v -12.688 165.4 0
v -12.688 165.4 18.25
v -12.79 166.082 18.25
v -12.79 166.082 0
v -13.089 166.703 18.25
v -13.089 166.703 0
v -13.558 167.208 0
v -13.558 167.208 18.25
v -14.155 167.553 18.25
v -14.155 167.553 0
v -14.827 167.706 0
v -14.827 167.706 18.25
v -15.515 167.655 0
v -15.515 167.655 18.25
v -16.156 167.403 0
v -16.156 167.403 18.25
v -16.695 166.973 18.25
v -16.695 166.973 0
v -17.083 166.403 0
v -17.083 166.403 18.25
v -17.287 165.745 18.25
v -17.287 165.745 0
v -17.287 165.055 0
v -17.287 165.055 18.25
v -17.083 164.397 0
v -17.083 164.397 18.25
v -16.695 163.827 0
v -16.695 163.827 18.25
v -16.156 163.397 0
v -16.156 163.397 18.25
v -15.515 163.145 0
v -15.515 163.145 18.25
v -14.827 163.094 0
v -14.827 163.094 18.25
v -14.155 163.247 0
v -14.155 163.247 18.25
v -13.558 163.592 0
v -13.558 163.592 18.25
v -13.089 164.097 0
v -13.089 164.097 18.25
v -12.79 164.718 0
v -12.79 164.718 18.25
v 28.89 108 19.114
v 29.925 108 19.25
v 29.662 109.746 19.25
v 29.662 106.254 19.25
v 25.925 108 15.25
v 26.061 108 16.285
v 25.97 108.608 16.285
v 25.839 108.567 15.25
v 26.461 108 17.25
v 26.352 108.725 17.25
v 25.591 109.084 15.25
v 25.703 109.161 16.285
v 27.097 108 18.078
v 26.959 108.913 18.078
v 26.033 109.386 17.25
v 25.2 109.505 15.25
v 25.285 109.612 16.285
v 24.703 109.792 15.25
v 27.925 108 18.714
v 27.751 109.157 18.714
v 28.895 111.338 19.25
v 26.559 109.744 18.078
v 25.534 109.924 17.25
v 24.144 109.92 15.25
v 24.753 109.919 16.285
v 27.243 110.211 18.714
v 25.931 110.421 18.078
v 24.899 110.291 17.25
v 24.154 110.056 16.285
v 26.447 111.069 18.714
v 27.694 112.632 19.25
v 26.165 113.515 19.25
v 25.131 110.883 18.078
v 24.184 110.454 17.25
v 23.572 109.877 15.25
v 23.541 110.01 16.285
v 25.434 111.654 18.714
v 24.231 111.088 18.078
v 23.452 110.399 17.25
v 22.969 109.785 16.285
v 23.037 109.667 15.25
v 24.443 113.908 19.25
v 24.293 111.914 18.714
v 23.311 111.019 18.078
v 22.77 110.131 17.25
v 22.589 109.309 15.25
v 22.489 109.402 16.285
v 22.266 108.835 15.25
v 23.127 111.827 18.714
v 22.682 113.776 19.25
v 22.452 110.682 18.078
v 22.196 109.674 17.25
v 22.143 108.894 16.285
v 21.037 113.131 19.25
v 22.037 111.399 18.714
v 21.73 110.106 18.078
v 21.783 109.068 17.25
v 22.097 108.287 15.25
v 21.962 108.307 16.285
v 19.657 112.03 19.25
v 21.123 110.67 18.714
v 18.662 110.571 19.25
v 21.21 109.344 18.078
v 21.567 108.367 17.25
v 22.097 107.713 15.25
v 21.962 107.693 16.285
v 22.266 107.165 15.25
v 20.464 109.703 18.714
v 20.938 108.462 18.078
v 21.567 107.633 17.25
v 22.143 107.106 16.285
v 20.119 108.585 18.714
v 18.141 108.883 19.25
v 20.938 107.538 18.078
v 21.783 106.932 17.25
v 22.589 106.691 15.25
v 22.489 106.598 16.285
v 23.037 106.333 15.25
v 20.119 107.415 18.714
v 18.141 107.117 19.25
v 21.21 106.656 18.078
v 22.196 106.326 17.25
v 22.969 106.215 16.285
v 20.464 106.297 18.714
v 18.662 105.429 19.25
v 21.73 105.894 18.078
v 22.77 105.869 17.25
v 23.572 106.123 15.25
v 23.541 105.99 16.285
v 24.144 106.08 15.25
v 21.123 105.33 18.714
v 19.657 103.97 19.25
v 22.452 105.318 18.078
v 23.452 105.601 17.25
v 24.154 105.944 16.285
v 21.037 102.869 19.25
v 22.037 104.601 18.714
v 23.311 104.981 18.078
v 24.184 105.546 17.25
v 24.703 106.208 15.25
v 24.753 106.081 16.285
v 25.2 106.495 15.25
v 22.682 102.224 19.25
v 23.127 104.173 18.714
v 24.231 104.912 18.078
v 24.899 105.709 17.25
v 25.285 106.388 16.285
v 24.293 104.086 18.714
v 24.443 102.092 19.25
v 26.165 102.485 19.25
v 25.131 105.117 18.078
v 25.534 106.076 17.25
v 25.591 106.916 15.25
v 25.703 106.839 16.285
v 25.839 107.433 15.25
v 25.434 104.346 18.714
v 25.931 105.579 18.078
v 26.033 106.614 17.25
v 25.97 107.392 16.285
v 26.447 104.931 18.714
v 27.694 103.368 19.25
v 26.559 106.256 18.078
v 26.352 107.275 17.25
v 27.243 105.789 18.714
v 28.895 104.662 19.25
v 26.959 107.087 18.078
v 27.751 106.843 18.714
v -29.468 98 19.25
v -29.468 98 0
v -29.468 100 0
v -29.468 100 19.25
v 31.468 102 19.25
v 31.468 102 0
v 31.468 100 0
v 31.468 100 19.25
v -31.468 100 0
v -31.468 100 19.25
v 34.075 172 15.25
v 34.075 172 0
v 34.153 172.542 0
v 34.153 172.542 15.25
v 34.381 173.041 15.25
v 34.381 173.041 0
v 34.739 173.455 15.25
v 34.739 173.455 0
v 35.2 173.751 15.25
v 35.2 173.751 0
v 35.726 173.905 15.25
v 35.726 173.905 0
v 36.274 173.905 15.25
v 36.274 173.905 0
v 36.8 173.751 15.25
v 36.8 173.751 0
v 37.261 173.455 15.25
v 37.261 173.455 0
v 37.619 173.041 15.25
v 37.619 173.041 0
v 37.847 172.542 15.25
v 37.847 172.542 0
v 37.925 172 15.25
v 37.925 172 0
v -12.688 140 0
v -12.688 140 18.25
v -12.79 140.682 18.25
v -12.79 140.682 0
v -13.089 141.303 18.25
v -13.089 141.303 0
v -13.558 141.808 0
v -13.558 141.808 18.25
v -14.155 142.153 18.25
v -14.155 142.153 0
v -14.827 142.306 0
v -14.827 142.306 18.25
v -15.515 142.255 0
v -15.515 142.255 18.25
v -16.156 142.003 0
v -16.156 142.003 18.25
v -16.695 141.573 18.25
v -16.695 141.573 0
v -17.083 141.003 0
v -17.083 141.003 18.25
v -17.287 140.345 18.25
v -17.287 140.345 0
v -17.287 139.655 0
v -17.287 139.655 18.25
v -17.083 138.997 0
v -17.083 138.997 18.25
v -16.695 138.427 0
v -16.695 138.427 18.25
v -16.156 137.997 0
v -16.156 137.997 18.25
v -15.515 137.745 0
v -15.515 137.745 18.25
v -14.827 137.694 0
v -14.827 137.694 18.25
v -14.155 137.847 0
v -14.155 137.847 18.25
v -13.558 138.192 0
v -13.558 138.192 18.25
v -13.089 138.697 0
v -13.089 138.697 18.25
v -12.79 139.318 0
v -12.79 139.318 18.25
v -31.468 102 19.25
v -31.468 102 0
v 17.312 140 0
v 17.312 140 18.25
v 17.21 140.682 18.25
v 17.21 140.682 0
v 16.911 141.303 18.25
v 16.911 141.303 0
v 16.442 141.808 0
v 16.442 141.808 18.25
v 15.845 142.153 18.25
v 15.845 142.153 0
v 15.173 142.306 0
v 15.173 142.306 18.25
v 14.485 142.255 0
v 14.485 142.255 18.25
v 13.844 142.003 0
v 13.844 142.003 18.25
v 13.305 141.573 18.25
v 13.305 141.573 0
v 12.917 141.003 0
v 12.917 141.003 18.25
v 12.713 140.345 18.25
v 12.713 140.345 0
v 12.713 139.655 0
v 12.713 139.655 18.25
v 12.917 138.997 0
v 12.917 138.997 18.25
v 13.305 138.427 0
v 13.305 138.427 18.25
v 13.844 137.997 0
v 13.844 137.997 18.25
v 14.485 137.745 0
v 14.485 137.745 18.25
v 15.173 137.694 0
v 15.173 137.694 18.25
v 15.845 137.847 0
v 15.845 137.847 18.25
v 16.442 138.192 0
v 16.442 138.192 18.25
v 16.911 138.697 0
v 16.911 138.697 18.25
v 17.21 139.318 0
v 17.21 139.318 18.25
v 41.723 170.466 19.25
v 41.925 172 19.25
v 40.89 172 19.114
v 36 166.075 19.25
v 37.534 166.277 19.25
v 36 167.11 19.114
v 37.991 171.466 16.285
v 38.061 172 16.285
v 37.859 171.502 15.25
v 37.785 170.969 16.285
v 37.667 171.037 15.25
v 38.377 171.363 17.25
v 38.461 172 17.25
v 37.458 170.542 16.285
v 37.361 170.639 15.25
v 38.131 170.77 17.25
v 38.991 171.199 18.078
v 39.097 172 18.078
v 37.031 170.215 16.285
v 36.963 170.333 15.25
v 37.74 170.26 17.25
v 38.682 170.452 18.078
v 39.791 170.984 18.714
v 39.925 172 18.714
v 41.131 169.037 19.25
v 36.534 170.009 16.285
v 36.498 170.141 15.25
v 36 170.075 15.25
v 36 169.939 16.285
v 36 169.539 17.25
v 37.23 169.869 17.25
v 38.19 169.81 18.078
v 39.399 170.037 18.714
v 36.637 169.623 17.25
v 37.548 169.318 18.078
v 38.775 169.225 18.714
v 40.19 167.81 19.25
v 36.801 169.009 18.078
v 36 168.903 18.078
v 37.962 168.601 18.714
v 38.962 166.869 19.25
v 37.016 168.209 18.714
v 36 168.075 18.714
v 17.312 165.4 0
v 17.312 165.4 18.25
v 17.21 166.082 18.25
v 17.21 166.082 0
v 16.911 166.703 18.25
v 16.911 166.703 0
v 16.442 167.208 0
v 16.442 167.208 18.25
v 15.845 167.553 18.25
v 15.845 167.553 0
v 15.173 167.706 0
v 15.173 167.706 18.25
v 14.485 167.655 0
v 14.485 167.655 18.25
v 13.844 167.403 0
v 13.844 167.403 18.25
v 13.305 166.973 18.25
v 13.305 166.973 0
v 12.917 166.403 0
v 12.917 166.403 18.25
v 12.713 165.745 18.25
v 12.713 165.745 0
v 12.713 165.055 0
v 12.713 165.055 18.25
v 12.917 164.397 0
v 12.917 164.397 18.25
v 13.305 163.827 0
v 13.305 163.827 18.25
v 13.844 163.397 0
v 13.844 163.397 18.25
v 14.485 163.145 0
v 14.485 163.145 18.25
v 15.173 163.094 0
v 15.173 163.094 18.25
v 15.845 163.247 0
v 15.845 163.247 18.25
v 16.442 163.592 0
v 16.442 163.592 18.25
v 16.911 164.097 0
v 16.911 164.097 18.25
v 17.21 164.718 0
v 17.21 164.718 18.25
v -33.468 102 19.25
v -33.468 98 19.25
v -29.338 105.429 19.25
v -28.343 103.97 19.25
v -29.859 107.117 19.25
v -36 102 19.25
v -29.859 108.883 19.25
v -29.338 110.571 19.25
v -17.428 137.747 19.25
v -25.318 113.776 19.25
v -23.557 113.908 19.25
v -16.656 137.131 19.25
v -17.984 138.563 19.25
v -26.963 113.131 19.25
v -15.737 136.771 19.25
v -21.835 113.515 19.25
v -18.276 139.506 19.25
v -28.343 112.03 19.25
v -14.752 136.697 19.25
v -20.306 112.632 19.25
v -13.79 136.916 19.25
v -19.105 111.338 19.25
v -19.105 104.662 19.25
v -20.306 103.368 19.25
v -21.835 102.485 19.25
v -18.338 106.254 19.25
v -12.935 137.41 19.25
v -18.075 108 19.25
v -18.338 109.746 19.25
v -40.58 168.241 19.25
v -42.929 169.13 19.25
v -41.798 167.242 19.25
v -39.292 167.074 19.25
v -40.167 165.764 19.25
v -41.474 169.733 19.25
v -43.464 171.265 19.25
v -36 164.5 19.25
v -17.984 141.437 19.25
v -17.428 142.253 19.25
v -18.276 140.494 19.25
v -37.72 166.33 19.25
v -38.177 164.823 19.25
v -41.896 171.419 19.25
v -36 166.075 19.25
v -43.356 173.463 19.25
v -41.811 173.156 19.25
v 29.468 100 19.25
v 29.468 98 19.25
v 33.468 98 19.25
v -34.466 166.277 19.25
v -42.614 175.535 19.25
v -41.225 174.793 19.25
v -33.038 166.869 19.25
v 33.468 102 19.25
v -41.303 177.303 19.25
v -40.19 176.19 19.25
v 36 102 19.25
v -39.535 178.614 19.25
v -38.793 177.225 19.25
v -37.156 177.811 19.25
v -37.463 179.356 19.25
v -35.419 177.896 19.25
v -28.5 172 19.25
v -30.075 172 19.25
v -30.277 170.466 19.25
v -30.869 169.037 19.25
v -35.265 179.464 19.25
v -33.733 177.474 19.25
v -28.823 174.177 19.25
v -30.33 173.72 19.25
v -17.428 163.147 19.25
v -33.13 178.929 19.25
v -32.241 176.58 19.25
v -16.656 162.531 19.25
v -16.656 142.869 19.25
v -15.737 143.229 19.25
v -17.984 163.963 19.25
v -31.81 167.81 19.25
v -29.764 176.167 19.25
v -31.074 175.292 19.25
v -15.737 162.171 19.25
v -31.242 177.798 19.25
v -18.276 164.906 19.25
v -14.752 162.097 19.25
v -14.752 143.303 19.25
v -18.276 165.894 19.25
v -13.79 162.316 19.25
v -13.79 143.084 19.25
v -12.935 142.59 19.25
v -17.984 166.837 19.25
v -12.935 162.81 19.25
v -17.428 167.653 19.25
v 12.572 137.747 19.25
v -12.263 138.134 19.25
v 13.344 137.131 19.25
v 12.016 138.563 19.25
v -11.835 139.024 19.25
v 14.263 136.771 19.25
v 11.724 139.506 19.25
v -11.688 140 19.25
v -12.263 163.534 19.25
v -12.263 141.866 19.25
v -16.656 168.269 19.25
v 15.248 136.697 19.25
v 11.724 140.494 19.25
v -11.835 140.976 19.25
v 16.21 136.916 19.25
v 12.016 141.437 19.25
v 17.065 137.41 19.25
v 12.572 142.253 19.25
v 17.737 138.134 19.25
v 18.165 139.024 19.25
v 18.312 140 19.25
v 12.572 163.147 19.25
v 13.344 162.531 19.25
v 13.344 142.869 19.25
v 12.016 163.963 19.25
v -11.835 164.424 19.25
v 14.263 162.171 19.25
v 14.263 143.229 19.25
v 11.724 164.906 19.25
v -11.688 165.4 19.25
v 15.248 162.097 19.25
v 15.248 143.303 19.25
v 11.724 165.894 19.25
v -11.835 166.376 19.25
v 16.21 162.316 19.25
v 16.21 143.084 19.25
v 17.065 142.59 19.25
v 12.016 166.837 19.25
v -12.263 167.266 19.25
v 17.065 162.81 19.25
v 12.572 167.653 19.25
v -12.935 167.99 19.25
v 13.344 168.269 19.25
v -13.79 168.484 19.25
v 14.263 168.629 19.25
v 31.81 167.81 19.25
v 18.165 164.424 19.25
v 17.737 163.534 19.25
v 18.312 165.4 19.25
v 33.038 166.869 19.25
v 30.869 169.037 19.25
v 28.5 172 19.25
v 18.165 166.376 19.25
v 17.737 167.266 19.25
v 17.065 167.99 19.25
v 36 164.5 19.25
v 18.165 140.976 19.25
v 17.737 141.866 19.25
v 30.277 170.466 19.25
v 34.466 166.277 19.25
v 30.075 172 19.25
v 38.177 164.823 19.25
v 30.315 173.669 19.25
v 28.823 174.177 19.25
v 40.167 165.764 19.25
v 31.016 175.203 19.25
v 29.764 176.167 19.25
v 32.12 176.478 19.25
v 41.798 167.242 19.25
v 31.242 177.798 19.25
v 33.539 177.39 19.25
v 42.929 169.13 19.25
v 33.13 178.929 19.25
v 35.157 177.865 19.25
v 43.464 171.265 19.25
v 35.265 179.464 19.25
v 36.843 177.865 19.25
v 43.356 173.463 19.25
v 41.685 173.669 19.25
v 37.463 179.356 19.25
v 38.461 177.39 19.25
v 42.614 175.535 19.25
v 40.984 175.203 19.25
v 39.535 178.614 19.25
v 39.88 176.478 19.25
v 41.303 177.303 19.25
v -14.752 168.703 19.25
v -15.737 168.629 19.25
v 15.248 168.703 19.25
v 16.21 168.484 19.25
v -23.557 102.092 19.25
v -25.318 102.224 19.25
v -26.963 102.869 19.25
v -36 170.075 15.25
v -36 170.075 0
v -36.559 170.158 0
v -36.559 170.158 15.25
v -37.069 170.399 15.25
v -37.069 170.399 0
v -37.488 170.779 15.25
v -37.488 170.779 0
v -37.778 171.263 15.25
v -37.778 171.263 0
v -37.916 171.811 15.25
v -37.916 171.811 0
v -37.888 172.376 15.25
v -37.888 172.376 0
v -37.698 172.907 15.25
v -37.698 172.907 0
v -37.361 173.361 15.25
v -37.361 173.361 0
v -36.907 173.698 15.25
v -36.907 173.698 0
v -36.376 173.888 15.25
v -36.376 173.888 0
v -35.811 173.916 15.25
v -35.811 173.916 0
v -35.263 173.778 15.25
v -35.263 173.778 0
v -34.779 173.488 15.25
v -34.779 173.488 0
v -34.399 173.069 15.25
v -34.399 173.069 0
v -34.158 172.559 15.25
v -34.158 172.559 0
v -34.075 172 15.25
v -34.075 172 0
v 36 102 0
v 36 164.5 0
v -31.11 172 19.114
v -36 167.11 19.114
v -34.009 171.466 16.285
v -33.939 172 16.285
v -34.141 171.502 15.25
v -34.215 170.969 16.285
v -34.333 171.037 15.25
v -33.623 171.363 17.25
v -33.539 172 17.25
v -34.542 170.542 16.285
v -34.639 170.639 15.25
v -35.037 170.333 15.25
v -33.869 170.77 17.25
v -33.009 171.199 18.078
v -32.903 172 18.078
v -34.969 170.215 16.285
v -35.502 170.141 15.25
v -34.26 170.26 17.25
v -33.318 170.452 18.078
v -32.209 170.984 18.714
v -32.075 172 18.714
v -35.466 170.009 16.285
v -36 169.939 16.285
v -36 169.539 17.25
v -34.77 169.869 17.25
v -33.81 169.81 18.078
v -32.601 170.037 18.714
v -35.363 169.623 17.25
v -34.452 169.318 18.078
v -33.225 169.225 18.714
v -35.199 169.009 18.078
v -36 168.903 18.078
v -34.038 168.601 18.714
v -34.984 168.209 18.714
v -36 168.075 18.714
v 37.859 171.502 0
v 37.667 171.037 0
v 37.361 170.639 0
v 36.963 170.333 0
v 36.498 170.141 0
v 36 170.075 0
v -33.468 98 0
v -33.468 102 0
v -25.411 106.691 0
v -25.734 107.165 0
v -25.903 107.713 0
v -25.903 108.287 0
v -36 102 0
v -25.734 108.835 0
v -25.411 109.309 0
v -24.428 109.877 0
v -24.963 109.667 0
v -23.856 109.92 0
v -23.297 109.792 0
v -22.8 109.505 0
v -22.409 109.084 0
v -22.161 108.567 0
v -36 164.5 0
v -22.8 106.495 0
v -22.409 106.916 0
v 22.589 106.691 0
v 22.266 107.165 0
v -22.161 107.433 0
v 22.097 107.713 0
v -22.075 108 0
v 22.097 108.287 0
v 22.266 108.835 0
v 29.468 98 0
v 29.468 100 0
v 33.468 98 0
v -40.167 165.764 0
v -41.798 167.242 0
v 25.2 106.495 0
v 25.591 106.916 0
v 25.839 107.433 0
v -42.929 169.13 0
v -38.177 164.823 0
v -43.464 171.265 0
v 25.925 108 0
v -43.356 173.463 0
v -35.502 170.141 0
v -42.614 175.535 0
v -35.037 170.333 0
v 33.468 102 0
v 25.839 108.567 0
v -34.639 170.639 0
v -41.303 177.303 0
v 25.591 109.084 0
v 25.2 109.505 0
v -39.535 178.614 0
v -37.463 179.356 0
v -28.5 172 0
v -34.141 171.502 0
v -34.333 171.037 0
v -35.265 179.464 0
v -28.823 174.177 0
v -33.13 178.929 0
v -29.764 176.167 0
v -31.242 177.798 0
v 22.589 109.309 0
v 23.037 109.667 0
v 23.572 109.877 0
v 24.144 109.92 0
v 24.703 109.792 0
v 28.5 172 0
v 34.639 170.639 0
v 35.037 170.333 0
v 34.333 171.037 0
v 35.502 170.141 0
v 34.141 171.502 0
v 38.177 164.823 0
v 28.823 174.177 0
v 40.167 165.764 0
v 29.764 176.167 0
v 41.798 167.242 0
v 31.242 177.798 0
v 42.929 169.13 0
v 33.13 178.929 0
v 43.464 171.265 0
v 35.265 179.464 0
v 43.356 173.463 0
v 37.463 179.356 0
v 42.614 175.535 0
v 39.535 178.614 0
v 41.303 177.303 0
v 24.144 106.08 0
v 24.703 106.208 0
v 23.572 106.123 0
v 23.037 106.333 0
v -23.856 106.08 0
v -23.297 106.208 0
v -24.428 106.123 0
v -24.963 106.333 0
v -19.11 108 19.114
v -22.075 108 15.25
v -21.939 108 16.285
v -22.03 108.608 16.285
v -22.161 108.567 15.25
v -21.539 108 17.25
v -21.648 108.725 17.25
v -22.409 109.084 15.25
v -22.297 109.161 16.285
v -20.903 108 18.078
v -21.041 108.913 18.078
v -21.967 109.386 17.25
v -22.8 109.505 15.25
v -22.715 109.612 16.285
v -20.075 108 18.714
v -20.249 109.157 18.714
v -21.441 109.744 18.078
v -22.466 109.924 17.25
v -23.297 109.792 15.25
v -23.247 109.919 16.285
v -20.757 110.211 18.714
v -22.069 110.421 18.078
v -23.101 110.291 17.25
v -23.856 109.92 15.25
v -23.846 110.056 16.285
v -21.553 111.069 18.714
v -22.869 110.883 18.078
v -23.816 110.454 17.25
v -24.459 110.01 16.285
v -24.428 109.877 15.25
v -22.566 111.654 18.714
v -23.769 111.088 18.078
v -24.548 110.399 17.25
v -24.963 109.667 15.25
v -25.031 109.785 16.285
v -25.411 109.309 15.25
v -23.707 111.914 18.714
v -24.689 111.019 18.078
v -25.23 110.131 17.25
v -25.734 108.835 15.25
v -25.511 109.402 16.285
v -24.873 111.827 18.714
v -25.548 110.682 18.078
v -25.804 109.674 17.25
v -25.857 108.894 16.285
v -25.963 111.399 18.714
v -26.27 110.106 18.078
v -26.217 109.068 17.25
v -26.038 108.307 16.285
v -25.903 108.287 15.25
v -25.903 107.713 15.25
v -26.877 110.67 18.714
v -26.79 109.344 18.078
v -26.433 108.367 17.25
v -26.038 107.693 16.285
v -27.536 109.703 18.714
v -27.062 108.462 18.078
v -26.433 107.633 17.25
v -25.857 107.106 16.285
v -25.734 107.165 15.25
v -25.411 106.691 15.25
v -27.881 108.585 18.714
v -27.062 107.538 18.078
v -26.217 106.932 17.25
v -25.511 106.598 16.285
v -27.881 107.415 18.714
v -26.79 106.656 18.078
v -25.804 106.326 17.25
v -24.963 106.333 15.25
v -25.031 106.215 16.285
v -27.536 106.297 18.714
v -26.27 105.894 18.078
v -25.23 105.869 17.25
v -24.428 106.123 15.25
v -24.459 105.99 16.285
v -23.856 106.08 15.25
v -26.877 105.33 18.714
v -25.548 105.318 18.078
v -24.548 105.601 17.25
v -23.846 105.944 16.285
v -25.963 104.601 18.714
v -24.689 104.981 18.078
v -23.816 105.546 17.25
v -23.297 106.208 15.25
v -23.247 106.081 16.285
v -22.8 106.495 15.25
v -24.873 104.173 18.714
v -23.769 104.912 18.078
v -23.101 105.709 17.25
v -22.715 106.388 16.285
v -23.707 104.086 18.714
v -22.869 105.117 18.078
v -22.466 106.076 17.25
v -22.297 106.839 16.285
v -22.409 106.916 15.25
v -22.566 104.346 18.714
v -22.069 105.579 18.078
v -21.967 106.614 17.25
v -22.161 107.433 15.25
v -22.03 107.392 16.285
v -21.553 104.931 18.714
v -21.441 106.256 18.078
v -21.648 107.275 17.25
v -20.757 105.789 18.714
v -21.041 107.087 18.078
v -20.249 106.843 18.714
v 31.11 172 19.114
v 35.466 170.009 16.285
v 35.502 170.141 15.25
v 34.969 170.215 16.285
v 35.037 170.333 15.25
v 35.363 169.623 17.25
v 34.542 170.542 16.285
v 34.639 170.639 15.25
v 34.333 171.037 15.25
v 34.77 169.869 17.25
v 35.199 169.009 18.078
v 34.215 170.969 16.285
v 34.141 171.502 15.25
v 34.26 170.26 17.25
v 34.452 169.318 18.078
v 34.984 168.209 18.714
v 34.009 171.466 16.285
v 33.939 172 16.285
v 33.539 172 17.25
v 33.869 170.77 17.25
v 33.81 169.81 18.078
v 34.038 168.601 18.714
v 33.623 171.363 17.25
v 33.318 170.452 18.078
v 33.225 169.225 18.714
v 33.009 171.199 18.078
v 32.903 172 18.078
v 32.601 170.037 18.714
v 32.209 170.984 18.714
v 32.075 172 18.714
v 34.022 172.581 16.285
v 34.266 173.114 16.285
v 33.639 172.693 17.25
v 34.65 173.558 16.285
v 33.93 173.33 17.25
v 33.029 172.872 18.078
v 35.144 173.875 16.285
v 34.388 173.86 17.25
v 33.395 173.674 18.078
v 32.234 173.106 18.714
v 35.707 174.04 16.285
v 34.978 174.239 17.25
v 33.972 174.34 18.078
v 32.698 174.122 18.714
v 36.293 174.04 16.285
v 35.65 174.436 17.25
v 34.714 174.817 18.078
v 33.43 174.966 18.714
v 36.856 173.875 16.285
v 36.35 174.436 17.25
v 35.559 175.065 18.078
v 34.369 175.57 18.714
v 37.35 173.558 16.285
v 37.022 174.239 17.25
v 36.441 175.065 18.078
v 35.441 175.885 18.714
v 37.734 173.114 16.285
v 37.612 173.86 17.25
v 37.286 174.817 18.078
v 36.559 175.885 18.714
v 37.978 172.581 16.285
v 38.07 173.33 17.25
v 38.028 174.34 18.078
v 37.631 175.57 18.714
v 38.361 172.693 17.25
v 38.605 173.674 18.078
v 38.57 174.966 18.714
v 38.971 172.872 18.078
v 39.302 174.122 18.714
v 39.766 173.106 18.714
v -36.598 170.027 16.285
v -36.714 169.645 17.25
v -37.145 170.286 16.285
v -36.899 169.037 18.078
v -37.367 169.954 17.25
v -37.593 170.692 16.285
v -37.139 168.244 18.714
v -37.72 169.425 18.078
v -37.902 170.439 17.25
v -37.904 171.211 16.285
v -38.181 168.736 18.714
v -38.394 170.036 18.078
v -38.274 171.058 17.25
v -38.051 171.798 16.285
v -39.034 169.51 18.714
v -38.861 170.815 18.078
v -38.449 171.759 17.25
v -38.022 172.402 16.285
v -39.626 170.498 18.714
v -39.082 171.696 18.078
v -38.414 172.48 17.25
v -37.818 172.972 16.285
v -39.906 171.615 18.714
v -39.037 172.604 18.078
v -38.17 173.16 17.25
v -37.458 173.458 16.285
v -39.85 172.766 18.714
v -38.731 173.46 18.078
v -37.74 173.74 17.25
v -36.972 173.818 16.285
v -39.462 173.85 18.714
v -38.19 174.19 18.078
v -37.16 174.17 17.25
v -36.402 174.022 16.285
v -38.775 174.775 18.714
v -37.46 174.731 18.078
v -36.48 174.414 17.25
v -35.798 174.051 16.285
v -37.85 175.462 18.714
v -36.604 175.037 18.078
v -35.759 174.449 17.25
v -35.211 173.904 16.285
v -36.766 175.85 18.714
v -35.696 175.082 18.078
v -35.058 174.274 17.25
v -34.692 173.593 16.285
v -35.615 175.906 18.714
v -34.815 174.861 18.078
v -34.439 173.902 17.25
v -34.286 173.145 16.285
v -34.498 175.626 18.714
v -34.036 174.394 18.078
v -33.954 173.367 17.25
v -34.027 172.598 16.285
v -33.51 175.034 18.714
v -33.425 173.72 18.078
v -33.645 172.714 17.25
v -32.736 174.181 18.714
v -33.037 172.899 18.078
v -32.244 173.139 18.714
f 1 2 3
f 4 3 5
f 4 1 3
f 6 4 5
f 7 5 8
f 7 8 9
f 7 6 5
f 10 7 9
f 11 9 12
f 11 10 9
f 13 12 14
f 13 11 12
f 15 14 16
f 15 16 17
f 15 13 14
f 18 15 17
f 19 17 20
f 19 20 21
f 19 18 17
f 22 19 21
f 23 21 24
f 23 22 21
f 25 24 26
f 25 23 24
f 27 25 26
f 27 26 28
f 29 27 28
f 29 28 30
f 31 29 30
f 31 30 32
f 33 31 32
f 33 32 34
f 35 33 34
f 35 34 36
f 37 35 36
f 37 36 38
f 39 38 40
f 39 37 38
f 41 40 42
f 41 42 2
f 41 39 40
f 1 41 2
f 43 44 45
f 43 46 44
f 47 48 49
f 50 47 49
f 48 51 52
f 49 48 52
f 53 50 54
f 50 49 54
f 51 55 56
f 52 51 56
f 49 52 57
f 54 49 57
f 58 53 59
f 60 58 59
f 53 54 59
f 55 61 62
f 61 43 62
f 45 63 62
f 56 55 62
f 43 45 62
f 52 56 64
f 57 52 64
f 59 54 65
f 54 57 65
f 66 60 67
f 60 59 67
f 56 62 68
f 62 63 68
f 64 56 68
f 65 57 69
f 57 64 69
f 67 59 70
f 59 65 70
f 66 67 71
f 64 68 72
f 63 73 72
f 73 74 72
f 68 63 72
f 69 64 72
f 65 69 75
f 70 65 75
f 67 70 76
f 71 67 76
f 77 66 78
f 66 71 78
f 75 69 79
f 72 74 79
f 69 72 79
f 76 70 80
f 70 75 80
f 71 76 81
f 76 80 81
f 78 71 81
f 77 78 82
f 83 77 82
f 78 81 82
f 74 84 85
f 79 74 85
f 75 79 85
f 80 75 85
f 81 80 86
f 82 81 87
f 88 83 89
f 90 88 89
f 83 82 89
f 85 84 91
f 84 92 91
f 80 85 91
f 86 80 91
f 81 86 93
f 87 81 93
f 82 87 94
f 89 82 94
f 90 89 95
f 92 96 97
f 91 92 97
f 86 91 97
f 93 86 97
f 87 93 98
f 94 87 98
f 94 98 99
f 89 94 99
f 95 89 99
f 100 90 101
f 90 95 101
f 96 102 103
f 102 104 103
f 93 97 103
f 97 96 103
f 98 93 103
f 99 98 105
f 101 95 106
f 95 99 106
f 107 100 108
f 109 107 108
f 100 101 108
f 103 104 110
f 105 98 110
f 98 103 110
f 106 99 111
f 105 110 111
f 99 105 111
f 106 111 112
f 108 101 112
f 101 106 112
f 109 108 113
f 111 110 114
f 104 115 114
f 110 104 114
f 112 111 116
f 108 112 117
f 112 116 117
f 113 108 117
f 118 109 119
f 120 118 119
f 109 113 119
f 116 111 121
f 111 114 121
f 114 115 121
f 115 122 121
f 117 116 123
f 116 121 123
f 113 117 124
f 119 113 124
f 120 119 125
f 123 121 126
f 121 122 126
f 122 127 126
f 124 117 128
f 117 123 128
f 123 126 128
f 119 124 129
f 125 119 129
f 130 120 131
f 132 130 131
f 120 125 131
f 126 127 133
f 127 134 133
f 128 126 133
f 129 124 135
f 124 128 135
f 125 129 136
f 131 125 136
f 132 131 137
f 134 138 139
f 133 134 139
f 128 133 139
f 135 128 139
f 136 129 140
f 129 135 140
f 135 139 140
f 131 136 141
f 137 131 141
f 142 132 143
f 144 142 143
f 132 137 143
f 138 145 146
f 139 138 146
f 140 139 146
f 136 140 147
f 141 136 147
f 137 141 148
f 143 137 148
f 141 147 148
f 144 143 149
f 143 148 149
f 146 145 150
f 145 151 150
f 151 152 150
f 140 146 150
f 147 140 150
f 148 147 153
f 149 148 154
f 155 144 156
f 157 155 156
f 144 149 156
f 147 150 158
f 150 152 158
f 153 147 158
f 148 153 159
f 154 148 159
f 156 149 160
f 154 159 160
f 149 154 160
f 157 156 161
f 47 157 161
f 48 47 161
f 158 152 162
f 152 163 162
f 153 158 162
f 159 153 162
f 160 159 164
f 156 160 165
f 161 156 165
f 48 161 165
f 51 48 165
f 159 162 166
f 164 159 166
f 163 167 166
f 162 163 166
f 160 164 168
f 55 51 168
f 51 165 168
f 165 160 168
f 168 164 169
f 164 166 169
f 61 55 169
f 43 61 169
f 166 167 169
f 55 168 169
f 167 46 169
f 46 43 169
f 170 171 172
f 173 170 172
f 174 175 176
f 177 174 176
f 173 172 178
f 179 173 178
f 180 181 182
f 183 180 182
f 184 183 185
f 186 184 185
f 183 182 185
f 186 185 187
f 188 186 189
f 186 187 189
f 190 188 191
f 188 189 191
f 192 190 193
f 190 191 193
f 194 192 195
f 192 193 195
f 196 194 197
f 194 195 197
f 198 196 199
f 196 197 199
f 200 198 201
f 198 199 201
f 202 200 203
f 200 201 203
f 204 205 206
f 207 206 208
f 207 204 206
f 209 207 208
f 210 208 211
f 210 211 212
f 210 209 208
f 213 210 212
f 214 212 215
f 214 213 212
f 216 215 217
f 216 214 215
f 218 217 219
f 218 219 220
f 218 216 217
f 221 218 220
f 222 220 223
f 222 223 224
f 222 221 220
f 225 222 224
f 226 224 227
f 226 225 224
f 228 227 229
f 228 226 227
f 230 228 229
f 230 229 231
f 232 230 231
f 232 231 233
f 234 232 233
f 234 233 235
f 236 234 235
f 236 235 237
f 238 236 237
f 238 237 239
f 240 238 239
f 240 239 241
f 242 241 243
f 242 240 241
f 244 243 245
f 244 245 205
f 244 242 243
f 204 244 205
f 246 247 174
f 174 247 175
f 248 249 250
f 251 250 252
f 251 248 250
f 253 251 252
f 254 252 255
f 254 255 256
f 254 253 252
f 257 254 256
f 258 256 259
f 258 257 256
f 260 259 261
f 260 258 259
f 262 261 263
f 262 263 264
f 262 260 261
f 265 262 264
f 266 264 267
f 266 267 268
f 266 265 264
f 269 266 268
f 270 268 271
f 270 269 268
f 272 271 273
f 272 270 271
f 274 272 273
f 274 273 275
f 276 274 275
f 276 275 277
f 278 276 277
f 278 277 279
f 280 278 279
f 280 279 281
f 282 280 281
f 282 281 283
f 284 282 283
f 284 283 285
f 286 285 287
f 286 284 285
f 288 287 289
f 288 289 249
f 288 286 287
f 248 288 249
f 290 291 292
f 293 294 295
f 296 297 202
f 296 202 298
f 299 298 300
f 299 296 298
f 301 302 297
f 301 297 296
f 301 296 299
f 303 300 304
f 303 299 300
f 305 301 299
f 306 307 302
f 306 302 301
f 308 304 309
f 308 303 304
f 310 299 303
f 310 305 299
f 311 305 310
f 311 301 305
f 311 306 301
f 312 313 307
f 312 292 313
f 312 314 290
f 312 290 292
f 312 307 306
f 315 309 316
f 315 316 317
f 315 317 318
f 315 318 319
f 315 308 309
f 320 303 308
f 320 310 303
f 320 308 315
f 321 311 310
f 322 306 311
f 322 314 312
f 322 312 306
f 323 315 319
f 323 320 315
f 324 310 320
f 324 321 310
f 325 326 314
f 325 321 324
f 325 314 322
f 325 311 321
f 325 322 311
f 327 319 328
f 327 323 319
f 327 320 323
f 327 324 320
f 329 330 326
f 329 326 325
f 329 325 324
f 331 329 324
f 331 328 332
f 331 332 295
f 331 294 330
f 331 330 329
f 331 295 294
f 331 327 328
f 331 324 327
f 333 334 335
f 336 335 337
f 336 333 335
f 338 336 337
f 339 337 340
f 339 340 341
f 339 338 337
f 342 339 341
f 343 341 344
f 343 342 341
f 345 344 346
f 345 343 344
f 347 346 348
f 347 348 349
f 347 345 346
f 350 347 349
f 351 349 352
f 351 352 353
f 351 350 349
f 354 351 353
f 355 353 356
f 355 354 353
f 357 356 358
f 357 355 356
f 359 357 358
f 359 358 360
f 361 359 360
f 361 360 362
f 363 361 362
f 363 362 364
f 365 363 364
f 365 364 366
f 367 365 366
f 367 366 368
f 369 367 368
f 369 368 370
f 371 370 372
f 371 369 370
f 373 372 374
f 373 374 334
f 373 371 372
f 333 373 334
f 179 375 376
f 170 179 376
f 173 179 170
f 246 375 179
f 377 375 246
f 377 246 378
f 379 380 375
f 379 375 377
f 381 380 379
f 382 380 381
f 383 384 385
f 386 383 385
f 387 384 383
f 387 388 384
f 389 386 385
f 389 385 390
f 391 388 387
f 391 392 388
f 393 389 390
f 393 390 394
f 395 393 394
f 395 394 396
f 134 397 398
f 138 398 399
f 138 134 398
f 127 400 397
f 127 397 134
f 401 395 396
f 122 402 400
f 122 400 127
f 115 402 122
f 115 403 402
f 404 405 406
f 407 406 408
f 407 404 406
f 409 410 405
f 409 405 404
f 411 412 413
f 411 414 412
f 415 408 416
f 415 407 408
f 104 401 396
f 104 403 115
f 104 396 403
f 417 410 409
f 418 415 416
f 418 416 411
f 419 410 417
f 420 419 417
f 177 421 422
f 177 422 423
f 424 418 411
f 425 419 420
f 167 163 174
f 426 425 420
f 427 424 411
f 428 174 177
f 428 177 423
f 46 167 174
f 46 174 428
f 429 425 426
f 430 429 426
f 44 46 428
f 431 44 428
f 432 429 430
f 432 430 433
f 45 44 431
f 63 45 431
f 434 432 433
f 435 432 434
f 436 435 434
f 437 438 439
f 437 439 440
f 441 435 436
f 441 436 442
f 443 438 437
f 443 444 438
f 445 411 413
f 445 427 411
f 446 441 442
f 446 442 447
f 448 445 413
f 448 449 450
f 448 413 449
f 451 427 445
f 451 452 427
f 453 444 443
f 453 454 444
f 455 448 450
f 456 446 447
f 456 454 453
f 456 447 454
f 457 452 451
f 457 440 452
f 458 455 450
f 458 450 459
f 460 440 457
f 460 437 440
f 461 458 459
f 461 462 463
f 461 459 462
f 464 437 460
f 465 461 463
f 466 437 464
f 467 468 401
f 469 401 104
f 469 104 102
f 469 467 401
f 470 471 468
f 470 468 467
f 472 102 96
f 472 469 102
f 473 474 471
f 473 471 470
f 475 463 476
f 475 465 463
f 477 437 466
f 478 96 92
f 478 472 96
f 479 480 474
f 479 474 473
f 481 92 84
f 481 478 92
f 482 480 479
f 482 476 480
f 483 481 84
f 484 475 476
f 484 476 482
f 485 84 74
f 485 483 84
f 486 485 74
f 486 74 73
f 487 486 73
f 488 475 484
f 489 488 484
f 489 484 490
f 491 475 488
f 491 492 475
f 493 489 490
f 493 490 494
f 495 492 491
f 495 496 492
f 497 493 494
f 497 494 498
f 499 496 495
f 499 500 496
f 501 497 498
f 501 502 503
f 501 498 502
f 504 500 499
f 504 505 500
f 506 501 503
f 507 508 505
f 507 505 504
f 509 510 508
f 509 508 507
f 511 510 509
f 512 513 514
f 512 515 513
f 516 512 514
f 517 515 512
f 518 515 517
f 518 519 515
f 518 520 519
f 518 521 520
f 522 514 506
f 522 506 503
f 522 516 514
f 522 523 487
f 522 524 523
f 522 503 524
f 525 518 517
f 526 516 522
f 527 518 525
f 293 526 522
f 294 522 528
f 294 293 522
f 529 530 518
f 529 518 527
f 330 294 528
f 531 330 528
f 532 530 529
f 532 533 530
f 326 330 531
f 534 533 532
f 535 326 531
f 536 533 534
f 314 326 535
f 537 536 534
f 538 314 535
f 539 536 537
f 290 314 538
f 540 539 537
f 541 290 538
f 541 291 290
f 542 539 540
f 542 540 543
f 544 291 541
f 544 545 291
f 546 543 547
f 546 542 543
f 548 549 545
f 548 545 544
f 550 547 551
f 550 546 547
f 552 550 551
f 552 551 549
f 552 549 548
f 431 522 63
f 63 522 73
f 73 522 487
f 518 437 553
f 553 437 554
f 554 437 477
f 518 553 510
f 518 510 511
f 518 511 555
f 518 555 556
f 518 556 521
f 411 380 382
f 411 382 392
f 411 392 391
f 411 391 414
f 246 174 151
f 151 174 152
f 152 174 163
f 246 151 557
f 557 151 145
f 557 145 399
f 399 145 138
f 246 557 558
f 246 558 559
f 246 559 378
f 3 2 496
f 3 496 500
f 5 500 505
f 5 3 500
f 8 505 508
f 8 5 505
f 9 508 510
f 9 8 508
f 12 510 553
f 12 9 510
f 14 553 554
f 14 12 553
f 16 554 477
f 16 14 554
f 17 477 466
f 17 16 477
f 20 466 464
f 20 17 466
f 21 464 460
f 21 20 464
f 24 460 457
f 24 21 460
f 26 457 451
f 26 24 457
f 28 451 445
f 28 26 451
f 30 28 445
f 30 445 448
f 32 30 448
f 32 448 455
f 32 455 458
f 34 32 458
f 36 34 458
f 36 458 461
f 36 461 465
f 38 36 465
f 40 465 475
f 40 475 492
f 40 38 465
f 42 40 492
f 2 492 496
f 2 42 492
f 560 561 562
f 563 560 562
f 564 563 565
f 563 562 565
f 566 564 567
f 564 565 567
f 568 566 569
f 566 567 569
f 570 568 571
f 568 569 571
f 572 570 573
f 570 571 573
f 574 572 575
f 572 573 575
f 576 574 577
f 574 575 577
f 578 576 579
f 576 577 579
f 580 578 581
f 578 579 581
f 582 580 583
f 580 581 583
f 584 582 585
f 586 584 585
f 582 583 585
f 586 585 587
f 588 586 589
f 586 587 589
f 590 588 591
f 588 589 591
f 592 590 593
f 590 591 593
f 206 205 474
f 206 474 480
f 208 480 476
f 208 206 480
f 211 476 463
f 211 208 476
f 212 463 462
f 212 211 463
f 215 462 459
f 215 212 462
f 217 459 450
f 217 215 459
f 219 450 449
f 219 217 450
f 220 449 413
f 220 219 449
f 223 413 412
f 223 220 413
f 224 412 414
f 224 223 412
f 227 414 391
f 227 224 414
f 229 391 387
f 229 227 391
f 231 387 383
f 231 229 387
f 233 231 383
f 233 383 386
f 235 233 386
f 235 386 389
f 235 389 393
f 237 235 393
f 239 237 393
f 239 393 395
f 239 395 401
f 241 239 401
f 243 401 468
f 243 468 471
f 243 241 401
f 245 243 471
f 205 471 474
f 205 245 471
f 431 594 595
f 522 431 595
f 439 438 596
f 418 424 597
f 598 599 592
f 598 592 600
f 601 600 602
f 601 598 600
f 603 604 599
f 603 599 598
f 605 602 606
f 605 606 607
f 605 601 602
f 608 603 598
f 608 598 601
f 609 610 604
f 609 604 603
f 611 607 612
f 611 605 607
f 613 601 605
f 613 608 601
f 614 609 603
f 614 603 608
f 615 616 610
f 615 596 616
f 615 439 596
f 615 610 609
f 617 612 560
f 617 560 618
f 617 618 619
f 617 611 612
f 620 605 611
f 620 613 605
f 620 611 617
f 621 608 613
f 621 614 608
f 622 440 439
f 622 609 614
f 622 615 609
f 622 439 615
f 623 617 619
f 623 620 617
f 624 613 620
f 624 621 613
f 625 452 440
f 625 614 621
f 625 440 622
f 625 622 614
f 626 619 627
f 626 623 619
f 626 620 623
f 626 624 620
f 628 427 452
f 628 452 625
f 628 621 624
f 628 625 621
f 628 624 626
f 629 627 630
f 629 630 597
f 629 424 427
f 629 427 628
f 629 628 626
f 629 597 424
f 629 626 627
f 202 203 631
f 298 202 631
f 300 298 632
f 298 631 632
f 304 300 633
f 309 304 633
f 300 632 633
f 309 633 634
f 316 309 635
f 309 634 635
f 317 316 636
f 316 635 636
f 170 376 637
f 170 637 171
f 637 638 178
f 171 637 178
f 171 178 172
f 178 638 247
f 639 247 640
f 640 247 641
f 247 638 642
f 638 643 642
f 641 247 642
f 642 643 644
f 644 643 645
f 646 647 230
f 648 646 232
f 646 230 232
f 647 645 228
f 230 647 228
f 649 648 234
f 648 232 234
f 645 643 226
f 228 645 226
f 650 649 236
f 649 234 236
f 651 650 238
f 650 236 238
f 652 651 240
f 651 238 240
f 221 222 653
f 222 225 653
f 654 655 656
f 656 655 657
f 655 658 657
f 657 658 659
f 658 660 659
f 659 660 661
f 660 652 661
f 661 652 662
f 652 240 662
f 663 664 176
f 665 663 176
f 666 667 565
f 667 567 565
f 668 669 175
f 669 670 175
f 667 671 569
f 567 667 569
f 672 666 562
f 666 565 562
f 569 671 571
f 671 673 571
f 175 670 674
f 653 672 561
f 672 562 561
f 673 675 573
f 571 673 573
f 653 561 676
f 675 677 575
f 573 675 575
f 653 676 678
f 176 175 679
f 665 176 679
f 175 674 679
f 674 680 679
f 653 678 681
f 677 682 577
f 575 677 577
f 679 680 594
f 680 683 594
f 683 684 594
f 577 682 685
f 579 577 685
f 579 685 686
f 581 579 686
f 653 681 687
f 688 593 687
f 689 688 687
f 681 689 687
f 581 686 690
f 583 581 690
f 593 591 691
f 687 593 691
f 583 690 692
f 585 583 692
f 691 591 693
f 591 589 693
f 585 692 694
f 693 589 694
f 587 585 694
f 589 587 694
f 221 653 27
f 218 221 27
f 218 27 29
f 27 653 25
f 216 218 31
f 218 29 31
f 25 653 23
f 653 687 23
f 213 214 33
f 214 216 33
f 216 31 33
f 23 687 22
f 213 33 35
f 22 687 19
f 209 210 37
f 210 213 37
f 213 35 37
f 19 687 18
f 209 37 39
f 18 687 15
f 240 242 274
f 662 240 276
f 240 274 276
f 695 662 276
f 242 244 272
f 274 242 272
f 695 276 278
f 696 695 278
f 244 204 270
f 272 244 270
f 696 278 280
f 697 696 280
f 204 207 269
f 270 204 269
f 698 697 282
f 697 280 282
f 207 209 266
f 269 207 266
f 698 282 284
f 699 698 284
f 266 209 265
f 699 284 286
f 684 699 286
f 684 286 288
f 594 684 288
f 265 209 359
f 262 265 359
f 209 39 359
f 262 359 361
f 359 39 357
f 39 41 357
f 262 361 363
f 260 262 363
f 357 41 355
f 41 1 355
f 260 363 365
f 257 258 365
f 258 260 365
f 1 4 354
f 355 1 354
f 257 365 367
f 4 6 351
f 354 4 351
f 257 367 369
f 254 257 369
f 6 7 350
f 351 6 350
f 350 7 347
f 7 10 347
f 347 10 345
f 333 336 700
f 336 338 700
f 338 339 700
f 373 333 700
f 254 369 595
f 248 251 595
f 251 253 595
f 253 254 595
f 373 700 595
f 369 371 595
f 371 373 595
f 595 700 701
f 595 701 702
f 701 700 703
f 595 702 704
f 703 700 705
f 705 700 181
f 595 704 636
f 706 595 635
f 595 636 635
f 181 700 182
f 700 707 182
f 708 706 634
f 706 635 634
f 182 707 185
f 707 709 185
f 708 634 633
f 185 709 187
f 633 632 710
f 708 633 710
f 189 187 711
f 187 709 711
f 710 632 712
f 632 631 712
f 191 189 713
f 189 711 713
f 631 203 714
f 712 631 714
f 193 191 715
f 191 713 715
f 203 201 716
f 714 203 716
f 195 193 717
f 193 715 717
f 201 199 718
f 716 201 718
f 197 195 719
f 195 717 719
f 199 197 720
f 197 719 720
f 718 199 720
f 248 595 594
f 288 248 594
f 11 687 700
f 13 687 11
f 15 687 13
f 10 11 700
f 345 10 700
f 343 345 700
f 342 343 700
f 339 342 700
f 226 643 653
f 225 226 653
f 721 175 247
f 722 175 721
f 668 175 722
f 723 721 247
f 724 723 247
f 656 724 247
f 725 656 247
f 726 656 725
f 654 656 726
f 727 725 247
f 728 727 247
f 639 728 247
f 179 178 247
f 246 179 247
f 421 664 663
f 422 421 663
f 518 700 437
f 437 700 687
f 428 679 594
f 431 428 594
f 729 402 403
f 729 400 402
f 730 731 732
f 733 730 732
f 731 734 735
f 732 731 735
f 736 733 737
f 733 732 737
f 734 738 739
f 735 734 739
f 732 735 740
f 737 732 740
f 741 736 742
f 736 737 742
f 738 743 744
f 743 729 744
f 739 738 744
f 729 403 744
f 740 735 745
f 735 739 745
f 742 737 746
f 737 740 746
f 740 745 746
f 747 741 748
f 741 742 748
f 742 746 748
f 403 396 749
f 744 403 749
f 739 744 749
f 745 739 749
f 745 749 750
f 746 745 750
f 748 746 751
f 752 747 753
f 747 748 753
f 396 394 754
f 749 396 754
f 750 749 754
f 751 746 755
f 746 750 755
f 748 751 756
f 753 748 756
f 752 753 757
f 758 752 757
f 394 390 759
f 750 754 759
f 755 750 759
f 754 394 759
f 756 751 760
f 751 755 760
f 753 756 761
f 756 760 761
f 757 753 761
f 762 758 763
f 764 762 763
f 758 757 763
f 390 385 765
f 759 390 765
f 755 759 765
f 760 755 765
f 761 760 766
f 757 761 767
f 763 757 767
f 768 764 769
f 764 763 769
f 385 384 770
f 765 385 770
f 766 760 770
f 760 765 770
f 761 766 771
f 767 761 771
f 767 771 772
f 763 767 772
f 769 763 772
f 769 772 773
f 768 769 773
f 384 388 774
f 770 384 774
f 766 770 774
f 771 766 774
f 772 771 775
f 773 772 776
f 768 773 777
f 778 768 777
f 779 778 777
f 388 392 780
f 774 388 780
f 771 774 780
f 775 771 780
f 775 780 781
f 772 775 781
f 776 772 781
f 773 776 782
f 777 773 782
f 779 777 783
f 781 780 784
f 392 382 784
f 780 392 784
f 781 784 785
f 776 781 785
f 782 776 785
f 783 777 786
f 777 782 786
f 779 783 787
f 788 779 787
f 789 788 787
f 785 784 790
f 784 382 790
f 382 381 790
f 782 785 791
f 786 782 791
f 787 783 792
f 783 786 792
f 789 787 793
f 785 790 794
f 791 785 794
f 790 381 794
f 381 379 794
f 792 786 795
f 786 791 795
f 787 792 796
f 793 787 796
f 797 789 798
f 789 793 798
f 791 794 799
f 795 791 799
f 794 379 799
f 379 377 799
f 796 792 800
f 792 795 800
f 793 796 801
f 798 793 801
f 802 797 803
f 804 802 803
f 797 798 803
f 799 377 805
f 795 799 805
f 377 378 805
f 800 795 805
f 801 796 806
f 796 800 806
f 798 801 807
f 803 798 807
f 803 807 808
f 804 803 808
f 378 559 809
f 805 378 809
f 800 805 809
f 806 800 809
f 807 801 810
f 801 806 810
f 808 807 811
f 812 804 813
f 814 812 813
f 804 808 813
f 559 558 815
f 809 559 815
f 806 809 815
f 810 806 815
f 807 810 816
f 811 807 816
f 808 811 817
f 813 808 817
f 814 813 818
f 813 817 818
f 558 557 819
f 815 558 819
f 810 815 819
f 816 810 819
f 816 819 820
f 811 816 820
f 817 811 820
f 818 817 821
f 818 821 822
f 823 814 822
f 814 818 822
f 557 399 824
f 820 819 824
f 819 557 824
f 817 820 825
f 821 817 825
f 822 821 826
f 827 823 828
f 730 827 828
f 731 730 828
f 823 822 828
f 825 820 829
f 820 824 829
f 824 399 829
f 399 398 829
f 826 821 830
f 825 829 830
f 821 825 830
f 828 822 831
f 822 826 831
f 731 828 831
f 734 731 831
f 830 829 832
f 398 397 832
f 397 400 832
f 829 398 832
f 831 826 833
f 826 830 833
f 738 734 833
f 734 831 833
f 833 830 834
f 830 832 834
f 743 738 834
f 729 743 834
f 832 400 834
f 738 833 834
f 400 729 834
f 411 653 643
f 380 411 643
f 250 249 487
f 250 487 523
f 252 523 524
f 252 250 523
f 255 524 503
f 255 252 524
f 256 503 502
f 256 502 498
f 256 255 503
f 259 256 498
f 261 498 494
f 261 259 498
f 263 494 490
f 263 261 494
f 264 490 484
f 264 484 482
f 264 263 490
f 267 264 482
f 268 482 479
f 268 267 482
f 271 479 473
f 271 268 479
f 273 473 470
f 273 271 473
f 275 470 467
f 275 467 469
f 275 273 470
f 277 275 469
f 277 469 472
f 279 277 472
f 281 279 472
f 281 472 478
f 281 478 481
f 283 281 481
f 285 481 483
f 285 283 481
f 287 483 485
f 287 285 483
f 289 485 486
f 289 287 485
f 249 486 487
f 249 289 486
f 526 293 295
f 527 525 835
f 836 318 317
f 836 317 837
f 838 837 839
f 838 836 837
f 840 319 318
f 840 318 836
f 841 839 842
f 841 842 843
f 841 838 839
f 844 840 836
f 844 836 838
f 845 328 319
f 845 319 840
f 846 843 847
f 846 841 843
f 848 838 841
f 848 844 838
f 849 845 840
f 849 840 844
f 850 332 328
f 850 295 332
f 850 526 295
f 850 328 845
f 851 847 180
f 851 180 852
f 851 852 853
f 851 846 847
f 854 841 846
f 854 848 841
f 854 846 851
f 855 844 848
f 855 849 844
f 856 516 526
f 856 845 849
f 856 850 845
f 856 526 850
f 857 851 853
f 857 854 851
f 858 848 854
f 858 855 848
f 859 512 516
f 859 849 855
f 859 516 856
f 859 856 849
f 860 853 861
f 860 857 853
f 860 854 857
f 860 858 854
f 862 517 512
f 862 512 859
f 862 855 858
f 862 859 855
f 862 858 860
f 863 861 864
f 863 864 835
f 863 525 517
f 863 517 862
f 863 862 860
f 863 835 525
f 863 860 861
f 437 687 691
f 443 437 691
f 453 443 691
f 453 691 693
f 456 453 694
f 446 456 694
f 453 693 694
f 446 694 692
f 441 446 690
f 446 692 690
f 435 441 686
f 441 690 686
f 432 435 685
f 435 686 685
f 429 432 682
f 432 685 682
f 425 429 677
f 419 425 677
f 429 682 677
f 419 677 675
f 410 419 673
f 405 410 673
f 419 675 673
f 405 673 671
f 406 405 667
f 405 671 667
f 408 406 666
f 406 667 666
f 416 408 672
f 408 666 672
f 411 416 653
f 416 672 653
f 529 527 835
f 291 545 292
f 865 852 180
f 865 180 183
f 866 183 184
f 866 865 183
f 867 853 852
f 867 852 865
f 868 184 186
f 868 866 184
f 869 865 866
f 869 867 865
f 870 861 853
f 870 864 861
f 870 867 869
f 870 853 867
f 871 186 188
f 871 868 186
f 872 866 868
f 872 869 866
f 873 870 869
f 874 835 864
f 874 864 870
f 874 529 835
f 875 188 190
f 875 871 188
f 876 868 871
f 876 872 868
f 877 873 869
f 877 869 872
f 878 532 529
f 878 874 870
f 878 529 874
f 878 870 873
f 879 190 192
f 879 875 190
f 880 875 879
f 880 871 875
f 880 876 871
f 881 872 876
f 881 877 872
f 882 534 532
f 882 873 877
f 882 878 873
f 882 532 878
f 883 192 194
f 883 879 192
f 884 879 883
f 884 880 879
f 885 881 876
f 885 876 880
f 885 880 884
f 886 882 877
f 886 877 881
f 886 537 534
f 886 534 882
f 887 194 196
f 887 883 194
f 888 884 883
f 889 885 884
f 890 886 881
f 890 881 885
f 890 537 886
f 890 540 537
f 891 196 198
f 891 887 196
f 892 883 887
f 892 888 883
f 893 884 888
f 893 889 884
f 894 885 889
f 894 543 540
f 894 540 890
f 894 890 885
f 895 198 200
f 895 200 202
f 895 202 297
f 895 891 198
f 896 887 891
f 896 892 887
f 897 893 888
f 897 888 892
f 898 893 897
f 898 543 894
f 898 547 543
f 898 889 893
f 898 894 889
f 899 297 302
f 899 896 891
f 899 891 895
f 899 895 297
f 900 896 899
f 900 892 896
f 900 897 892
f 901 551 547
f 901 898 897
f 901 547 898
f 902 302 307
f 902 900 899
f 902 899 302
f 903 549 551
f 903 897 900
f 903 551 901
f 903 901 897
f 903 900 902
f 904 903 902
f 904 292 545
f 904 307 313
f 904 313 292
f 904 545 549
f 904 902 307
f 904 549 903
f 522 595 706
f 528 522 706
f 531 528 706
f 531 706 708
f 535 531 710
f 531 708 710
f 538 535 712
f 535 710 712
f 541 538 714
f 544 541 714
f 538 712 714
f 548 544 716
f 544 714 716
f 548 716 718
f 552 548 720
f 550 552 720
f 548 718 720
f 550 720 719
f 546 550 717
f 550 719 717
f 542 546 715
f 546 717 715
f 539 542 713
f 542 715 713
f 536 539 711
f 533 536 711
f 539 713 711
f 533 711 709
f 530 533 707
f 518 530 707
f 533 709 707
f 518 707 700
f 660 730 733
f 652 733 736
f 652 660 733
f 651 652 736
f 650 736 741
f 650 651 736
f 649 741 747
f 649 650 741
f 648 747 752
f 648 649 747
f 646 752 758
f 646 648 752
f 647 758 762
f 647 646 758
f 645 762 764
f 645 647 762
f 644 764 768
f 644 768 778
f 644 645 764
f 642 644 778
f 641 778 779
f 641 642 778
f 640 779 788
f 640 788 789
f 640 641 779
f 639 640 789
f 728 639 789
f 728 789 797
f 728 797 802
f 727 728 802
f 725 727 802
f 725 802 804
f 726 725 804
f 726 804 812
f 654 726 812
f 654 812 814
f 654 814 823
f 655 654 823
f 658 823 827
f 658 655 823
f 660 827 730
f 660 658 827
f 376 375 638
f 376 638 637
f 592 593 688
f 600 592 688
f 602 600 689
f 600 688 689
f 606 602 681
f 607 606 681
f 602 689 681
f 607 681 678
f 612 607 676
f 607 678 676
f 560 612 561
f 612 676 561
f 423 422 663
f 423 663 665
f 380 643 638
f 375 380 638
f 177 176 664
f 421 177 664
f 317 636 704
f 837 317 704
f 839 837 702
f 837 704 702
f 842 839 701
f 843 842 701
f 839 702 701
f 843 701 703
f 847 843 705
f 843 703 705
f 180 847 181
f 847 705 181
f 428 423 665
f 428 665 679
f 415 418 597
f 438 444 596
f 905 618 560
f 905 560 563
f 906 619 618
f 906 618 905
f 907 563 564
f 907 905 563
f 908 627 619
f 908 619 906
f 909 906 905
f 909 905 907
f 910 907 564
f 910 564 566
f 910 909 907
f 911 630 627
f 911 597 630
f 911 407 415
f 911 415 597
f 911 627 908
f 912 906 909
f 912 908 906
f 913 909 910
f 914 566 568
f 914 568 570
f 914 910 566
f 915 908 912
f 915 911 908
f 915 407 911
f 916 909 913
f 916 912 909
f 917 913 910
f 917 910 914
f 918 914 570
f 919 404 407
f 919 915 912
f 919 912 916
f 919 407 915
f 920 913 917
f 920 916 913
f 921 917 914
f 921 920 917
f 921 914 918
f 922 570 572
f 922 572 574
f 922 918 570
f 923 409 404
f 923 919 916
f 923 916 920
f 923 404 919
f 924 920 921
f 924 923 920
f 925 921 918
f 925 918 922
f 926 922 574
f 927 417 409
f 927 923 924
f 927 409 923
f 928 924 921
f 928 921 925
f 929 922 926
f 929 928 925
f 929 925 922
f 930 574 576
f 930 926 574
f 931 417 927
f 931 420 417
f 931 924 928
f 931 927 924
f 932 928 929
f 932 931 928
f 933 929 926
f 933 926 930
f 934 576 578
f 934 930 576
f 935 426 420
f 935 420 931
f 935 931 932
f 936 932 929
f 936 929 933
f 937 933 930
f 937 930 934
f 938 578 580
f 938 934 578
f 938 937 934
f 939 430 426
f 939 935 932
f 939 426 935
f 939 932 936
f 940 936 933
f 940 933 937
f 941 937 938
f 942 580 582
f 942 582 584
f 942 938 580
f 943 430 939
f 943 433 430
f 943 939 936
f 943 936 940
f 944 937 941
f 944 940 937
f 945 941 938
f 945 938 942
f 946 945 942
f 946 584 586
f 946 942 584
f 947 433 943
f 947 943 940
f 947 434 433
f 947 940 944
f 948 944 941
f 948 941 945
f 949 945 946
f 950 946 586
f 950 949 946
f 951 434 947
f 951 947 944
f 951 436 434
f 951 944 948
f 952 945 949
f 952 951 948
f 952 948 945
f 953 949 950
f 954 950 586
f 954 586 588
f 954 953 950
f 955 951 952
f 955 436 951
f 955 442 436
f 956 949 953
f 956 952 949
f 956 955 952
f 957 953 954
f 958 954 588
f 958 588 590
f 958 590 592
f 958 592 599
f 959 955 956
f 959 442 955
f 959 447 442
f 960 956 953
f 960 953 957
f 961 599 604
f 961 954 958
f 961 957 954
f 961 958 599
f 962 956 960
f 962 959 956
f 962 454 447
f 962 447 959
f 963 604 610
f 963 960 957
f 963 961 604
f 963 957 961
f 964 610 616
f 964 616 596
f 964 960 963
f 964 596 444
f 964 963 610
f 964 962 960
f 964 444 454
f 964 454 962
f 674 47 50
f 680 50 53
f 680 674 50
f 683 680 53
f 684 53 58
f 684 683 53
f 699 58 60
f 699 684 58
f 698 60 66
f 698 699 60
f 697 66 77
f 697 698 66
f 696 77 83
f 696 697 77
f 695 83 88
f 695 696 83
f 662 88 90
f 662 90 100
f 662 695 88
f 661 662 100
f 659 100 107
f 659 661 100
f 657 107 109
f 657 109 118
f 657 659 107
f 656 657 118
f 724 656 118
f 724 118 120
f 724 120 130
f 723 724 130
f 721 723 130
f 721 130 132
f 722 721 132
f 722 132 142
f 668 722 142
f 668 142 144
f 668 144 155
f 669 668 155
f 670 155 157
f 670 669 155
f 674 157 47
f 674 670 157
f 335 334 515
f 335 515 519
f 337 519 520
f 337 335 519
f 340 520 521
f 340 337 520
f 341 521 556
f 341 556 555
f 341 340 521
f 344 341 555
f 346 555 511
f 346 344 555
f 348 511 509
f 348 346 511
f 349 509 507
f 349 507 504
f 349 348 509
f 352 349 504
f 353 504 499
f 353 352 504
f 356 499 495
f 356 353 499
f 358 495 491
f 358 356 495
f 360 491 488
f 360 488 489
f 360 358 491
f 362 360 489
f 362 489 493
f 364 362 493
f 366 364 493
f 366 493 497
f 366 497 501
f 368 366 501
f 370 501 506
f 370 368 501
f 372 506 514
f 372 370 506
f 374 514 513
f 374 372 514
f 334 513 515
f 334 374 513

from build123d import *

# Parameters (mm, degrees)
F0_R     = 2.3125
F0_R_2   = 1.925
F1_DEPTH = 19.25
F2_R     = 4
F3_SIZE  = 1


with BuildPart() as f1:
    # F0 (on Top) → F1 (new body)
    with BuildSketch(Plane.XY):
        with BuildLine():
            Line((33.6678512394, 101.9999980927), (36, 101.9999980927))
            Line((36, 101.9999980927), (36, 164.4999980927))
            ThreePointArc((36, 164.4999980927), (30.6966991411, 166.6966972338), (28.5, 171.9999980927))
            Line((28.5, 171.9999980927), (0, 171.9999980927))
            Line((0, 171.9999980927), (0, 101.9999980927))
            Line((0, 101.9999980927), (31.2678519189, 101.9999980927))
            Line((31.2678519189, 101.9999980927), (31.4678515792, 101.9999980927))
            Line((31.4678515792, 101.9999980927), (33.4678515792, 101.9999980927))
            Line((33.4678515792, 101.9999980927), (33.6678512394, 101.9999980927))
        make_face()
        with Locations((15, 139.9999980927)):
            Circle(F0_R, mode=Mode.SUBTRACT)
        with Locations((24, 107.9999980927)):
            Circle(F0_R_2, mode=Mode.SUBTRACT)
        with Locations((15, 165.3999980927)):
            Circle(F0_R, mode=Mode.SUBTRACT)
        with BuildLine():
            Line((0, 101.9999980927), (0, 171.9999980927))
            Line((0, 171.9999980927), (-28.5, 171.9999980927))
            ThreePointArc((-28.5, 171.9999980927), (-30.6966991411, 166.6966972338), (-36, 164.4999980927))
            Line((-36, 164.4999980927), (-36, 101.9999980927))
            Line((-36, 101.9999980927), (-33.6678512394, 101.9999980927))
            Line((-33.6678512394, 101.9999980927), (-33.4678515792, 101.9999980927))
            Line((-33.4678515792, 101.9999980927), (-31.4678515792, 101.9999980927))
            Line((-31.4678515792, 101.9999980927), (-31.2678519189, 101.9999980927))
            Line((-31.2678519189, 101.9999980927), (0, 101.9999980927))
        make_face()
        with Locations((-24, 107.9999980927)):
            Circle(F0_R_2, mode=Mode.SUBTRACT)
        with Locations((-15, 139.9999980927)):
            Circle(F0_R, mode=Mode.SUBTRACT)
        with Locations((-15, 165.3999980927)):
            Circle(F0_R, mode=Mode.SUBTRACT)
        Polygon((-31.4678515792, 99.9999980927), (-31.4678515792, 101.9999980927), (-33.4678515792, 101.9999980927), (-33.4678515792, 97.9999980927), (-29.4678515792, 97.9999980927), (-29.4678515792, 99.9999980927), align=None)
        Polygon((33.4678515792, 97.9999980927), (33.4678515792, 101.9999980927), (31.4678515792, 101.9999980927), (31.4678515792, 99.9999980927), (29.4678515792, 99.9999980927), (29.4678515792, 97.9999980927), align=None)
        with BuildLine():
            ThreePointArc((-36, 164.4999980927), (-30.6966991411, 166.6966972338), (-28.5, 171.9999980927))
            Line((-28.5, 171.9999980927), (-34.075, 171.9999980927))
            ThreePointArc((-34.075, 171.9999980927), (-34.6388194462, 170.6388175389), (-36, 170.0749980927))
            Line((-36, 170.0749980927), (-36, 164.4999980927))
        make_face()
        with BuildLine():
            Line((-34.075, 171.9999980927), (-28.5, 171.9999980927))
            ThreePointArc((-28.5, 171.9999980927), (-41.3033008589, 177.3032989516), (-36, 164.4999980927))
            Line((-36, 164.4999980927), (-36, 170.0749980927))
            ThreePointArc((-36, 170.0749980927), (-37.3611805538, 173.3611786464), (-34.075, 171.9999980927))
        make_face()
        with BuildLine():
            Line((36, 170.0749980927), (36, 164.4999980927))
            ThreePointArc((36, 164.4999980927), (41.3033008589, 166.6966972338), (43.5, 171.9999980927))
            ThreePointArc((43.5, 171.9999980927), (36, 179.4999980927), (28.5, 171.9999980927))
            Line((28.5, 171.9999980927), (34.075, 171.9999980927))
            ThreePointArc((34.075, 171.9999980927), (36, 173.9249980927), (37.925, 171.9999980927))
            ThreePointArc((37.925, 171.9999980927), (37.3611805538, 170.6388175389), (36, 170.0749980927))
        make_face()
        with BuildLine():
            ThreePointArc((28.5, 171.9999980927), (30.6966991411, 166.6966972338), (36, 164.4999980927))
            Line((36, 164.4999980927), (36, 170.0749980927))
            ThreePointArc((36, 170.0749980927), (34.6388194462, 170.6388175389), (34.075, 171.9999980927))
            Line((34.075, 171.9999980927), (28.5, 171.9999980927))
        make_face()
    extrude(amount=F1_DEPTH)

    # F2
    f2_edges = [f1.edges().sort_by_distance(p)[0] for p in [
        (-36, 173.924998, 19.25),
        (-25.925, 107.999998, 19.25),
        (22.075, 107.999998, 19.25),
        (37.925, 171.999998, 19.25),
    ]]
    fillet(f2_edges, radius=F2_R)

    # F3
    f3_edges = [f1.edges().sort_by_distance(p)[0] for p in [
        (-17.3125, 165.399998, 19.25),
        (-17.3125, 139.999998, 19.25),
        (12.6875, 139.999998, 19.25),
        (12.6875, 165.399998, 19.25),
    ]]
    chamfer(f3_edges, length=F3_SIZE)


solid = f1.part
